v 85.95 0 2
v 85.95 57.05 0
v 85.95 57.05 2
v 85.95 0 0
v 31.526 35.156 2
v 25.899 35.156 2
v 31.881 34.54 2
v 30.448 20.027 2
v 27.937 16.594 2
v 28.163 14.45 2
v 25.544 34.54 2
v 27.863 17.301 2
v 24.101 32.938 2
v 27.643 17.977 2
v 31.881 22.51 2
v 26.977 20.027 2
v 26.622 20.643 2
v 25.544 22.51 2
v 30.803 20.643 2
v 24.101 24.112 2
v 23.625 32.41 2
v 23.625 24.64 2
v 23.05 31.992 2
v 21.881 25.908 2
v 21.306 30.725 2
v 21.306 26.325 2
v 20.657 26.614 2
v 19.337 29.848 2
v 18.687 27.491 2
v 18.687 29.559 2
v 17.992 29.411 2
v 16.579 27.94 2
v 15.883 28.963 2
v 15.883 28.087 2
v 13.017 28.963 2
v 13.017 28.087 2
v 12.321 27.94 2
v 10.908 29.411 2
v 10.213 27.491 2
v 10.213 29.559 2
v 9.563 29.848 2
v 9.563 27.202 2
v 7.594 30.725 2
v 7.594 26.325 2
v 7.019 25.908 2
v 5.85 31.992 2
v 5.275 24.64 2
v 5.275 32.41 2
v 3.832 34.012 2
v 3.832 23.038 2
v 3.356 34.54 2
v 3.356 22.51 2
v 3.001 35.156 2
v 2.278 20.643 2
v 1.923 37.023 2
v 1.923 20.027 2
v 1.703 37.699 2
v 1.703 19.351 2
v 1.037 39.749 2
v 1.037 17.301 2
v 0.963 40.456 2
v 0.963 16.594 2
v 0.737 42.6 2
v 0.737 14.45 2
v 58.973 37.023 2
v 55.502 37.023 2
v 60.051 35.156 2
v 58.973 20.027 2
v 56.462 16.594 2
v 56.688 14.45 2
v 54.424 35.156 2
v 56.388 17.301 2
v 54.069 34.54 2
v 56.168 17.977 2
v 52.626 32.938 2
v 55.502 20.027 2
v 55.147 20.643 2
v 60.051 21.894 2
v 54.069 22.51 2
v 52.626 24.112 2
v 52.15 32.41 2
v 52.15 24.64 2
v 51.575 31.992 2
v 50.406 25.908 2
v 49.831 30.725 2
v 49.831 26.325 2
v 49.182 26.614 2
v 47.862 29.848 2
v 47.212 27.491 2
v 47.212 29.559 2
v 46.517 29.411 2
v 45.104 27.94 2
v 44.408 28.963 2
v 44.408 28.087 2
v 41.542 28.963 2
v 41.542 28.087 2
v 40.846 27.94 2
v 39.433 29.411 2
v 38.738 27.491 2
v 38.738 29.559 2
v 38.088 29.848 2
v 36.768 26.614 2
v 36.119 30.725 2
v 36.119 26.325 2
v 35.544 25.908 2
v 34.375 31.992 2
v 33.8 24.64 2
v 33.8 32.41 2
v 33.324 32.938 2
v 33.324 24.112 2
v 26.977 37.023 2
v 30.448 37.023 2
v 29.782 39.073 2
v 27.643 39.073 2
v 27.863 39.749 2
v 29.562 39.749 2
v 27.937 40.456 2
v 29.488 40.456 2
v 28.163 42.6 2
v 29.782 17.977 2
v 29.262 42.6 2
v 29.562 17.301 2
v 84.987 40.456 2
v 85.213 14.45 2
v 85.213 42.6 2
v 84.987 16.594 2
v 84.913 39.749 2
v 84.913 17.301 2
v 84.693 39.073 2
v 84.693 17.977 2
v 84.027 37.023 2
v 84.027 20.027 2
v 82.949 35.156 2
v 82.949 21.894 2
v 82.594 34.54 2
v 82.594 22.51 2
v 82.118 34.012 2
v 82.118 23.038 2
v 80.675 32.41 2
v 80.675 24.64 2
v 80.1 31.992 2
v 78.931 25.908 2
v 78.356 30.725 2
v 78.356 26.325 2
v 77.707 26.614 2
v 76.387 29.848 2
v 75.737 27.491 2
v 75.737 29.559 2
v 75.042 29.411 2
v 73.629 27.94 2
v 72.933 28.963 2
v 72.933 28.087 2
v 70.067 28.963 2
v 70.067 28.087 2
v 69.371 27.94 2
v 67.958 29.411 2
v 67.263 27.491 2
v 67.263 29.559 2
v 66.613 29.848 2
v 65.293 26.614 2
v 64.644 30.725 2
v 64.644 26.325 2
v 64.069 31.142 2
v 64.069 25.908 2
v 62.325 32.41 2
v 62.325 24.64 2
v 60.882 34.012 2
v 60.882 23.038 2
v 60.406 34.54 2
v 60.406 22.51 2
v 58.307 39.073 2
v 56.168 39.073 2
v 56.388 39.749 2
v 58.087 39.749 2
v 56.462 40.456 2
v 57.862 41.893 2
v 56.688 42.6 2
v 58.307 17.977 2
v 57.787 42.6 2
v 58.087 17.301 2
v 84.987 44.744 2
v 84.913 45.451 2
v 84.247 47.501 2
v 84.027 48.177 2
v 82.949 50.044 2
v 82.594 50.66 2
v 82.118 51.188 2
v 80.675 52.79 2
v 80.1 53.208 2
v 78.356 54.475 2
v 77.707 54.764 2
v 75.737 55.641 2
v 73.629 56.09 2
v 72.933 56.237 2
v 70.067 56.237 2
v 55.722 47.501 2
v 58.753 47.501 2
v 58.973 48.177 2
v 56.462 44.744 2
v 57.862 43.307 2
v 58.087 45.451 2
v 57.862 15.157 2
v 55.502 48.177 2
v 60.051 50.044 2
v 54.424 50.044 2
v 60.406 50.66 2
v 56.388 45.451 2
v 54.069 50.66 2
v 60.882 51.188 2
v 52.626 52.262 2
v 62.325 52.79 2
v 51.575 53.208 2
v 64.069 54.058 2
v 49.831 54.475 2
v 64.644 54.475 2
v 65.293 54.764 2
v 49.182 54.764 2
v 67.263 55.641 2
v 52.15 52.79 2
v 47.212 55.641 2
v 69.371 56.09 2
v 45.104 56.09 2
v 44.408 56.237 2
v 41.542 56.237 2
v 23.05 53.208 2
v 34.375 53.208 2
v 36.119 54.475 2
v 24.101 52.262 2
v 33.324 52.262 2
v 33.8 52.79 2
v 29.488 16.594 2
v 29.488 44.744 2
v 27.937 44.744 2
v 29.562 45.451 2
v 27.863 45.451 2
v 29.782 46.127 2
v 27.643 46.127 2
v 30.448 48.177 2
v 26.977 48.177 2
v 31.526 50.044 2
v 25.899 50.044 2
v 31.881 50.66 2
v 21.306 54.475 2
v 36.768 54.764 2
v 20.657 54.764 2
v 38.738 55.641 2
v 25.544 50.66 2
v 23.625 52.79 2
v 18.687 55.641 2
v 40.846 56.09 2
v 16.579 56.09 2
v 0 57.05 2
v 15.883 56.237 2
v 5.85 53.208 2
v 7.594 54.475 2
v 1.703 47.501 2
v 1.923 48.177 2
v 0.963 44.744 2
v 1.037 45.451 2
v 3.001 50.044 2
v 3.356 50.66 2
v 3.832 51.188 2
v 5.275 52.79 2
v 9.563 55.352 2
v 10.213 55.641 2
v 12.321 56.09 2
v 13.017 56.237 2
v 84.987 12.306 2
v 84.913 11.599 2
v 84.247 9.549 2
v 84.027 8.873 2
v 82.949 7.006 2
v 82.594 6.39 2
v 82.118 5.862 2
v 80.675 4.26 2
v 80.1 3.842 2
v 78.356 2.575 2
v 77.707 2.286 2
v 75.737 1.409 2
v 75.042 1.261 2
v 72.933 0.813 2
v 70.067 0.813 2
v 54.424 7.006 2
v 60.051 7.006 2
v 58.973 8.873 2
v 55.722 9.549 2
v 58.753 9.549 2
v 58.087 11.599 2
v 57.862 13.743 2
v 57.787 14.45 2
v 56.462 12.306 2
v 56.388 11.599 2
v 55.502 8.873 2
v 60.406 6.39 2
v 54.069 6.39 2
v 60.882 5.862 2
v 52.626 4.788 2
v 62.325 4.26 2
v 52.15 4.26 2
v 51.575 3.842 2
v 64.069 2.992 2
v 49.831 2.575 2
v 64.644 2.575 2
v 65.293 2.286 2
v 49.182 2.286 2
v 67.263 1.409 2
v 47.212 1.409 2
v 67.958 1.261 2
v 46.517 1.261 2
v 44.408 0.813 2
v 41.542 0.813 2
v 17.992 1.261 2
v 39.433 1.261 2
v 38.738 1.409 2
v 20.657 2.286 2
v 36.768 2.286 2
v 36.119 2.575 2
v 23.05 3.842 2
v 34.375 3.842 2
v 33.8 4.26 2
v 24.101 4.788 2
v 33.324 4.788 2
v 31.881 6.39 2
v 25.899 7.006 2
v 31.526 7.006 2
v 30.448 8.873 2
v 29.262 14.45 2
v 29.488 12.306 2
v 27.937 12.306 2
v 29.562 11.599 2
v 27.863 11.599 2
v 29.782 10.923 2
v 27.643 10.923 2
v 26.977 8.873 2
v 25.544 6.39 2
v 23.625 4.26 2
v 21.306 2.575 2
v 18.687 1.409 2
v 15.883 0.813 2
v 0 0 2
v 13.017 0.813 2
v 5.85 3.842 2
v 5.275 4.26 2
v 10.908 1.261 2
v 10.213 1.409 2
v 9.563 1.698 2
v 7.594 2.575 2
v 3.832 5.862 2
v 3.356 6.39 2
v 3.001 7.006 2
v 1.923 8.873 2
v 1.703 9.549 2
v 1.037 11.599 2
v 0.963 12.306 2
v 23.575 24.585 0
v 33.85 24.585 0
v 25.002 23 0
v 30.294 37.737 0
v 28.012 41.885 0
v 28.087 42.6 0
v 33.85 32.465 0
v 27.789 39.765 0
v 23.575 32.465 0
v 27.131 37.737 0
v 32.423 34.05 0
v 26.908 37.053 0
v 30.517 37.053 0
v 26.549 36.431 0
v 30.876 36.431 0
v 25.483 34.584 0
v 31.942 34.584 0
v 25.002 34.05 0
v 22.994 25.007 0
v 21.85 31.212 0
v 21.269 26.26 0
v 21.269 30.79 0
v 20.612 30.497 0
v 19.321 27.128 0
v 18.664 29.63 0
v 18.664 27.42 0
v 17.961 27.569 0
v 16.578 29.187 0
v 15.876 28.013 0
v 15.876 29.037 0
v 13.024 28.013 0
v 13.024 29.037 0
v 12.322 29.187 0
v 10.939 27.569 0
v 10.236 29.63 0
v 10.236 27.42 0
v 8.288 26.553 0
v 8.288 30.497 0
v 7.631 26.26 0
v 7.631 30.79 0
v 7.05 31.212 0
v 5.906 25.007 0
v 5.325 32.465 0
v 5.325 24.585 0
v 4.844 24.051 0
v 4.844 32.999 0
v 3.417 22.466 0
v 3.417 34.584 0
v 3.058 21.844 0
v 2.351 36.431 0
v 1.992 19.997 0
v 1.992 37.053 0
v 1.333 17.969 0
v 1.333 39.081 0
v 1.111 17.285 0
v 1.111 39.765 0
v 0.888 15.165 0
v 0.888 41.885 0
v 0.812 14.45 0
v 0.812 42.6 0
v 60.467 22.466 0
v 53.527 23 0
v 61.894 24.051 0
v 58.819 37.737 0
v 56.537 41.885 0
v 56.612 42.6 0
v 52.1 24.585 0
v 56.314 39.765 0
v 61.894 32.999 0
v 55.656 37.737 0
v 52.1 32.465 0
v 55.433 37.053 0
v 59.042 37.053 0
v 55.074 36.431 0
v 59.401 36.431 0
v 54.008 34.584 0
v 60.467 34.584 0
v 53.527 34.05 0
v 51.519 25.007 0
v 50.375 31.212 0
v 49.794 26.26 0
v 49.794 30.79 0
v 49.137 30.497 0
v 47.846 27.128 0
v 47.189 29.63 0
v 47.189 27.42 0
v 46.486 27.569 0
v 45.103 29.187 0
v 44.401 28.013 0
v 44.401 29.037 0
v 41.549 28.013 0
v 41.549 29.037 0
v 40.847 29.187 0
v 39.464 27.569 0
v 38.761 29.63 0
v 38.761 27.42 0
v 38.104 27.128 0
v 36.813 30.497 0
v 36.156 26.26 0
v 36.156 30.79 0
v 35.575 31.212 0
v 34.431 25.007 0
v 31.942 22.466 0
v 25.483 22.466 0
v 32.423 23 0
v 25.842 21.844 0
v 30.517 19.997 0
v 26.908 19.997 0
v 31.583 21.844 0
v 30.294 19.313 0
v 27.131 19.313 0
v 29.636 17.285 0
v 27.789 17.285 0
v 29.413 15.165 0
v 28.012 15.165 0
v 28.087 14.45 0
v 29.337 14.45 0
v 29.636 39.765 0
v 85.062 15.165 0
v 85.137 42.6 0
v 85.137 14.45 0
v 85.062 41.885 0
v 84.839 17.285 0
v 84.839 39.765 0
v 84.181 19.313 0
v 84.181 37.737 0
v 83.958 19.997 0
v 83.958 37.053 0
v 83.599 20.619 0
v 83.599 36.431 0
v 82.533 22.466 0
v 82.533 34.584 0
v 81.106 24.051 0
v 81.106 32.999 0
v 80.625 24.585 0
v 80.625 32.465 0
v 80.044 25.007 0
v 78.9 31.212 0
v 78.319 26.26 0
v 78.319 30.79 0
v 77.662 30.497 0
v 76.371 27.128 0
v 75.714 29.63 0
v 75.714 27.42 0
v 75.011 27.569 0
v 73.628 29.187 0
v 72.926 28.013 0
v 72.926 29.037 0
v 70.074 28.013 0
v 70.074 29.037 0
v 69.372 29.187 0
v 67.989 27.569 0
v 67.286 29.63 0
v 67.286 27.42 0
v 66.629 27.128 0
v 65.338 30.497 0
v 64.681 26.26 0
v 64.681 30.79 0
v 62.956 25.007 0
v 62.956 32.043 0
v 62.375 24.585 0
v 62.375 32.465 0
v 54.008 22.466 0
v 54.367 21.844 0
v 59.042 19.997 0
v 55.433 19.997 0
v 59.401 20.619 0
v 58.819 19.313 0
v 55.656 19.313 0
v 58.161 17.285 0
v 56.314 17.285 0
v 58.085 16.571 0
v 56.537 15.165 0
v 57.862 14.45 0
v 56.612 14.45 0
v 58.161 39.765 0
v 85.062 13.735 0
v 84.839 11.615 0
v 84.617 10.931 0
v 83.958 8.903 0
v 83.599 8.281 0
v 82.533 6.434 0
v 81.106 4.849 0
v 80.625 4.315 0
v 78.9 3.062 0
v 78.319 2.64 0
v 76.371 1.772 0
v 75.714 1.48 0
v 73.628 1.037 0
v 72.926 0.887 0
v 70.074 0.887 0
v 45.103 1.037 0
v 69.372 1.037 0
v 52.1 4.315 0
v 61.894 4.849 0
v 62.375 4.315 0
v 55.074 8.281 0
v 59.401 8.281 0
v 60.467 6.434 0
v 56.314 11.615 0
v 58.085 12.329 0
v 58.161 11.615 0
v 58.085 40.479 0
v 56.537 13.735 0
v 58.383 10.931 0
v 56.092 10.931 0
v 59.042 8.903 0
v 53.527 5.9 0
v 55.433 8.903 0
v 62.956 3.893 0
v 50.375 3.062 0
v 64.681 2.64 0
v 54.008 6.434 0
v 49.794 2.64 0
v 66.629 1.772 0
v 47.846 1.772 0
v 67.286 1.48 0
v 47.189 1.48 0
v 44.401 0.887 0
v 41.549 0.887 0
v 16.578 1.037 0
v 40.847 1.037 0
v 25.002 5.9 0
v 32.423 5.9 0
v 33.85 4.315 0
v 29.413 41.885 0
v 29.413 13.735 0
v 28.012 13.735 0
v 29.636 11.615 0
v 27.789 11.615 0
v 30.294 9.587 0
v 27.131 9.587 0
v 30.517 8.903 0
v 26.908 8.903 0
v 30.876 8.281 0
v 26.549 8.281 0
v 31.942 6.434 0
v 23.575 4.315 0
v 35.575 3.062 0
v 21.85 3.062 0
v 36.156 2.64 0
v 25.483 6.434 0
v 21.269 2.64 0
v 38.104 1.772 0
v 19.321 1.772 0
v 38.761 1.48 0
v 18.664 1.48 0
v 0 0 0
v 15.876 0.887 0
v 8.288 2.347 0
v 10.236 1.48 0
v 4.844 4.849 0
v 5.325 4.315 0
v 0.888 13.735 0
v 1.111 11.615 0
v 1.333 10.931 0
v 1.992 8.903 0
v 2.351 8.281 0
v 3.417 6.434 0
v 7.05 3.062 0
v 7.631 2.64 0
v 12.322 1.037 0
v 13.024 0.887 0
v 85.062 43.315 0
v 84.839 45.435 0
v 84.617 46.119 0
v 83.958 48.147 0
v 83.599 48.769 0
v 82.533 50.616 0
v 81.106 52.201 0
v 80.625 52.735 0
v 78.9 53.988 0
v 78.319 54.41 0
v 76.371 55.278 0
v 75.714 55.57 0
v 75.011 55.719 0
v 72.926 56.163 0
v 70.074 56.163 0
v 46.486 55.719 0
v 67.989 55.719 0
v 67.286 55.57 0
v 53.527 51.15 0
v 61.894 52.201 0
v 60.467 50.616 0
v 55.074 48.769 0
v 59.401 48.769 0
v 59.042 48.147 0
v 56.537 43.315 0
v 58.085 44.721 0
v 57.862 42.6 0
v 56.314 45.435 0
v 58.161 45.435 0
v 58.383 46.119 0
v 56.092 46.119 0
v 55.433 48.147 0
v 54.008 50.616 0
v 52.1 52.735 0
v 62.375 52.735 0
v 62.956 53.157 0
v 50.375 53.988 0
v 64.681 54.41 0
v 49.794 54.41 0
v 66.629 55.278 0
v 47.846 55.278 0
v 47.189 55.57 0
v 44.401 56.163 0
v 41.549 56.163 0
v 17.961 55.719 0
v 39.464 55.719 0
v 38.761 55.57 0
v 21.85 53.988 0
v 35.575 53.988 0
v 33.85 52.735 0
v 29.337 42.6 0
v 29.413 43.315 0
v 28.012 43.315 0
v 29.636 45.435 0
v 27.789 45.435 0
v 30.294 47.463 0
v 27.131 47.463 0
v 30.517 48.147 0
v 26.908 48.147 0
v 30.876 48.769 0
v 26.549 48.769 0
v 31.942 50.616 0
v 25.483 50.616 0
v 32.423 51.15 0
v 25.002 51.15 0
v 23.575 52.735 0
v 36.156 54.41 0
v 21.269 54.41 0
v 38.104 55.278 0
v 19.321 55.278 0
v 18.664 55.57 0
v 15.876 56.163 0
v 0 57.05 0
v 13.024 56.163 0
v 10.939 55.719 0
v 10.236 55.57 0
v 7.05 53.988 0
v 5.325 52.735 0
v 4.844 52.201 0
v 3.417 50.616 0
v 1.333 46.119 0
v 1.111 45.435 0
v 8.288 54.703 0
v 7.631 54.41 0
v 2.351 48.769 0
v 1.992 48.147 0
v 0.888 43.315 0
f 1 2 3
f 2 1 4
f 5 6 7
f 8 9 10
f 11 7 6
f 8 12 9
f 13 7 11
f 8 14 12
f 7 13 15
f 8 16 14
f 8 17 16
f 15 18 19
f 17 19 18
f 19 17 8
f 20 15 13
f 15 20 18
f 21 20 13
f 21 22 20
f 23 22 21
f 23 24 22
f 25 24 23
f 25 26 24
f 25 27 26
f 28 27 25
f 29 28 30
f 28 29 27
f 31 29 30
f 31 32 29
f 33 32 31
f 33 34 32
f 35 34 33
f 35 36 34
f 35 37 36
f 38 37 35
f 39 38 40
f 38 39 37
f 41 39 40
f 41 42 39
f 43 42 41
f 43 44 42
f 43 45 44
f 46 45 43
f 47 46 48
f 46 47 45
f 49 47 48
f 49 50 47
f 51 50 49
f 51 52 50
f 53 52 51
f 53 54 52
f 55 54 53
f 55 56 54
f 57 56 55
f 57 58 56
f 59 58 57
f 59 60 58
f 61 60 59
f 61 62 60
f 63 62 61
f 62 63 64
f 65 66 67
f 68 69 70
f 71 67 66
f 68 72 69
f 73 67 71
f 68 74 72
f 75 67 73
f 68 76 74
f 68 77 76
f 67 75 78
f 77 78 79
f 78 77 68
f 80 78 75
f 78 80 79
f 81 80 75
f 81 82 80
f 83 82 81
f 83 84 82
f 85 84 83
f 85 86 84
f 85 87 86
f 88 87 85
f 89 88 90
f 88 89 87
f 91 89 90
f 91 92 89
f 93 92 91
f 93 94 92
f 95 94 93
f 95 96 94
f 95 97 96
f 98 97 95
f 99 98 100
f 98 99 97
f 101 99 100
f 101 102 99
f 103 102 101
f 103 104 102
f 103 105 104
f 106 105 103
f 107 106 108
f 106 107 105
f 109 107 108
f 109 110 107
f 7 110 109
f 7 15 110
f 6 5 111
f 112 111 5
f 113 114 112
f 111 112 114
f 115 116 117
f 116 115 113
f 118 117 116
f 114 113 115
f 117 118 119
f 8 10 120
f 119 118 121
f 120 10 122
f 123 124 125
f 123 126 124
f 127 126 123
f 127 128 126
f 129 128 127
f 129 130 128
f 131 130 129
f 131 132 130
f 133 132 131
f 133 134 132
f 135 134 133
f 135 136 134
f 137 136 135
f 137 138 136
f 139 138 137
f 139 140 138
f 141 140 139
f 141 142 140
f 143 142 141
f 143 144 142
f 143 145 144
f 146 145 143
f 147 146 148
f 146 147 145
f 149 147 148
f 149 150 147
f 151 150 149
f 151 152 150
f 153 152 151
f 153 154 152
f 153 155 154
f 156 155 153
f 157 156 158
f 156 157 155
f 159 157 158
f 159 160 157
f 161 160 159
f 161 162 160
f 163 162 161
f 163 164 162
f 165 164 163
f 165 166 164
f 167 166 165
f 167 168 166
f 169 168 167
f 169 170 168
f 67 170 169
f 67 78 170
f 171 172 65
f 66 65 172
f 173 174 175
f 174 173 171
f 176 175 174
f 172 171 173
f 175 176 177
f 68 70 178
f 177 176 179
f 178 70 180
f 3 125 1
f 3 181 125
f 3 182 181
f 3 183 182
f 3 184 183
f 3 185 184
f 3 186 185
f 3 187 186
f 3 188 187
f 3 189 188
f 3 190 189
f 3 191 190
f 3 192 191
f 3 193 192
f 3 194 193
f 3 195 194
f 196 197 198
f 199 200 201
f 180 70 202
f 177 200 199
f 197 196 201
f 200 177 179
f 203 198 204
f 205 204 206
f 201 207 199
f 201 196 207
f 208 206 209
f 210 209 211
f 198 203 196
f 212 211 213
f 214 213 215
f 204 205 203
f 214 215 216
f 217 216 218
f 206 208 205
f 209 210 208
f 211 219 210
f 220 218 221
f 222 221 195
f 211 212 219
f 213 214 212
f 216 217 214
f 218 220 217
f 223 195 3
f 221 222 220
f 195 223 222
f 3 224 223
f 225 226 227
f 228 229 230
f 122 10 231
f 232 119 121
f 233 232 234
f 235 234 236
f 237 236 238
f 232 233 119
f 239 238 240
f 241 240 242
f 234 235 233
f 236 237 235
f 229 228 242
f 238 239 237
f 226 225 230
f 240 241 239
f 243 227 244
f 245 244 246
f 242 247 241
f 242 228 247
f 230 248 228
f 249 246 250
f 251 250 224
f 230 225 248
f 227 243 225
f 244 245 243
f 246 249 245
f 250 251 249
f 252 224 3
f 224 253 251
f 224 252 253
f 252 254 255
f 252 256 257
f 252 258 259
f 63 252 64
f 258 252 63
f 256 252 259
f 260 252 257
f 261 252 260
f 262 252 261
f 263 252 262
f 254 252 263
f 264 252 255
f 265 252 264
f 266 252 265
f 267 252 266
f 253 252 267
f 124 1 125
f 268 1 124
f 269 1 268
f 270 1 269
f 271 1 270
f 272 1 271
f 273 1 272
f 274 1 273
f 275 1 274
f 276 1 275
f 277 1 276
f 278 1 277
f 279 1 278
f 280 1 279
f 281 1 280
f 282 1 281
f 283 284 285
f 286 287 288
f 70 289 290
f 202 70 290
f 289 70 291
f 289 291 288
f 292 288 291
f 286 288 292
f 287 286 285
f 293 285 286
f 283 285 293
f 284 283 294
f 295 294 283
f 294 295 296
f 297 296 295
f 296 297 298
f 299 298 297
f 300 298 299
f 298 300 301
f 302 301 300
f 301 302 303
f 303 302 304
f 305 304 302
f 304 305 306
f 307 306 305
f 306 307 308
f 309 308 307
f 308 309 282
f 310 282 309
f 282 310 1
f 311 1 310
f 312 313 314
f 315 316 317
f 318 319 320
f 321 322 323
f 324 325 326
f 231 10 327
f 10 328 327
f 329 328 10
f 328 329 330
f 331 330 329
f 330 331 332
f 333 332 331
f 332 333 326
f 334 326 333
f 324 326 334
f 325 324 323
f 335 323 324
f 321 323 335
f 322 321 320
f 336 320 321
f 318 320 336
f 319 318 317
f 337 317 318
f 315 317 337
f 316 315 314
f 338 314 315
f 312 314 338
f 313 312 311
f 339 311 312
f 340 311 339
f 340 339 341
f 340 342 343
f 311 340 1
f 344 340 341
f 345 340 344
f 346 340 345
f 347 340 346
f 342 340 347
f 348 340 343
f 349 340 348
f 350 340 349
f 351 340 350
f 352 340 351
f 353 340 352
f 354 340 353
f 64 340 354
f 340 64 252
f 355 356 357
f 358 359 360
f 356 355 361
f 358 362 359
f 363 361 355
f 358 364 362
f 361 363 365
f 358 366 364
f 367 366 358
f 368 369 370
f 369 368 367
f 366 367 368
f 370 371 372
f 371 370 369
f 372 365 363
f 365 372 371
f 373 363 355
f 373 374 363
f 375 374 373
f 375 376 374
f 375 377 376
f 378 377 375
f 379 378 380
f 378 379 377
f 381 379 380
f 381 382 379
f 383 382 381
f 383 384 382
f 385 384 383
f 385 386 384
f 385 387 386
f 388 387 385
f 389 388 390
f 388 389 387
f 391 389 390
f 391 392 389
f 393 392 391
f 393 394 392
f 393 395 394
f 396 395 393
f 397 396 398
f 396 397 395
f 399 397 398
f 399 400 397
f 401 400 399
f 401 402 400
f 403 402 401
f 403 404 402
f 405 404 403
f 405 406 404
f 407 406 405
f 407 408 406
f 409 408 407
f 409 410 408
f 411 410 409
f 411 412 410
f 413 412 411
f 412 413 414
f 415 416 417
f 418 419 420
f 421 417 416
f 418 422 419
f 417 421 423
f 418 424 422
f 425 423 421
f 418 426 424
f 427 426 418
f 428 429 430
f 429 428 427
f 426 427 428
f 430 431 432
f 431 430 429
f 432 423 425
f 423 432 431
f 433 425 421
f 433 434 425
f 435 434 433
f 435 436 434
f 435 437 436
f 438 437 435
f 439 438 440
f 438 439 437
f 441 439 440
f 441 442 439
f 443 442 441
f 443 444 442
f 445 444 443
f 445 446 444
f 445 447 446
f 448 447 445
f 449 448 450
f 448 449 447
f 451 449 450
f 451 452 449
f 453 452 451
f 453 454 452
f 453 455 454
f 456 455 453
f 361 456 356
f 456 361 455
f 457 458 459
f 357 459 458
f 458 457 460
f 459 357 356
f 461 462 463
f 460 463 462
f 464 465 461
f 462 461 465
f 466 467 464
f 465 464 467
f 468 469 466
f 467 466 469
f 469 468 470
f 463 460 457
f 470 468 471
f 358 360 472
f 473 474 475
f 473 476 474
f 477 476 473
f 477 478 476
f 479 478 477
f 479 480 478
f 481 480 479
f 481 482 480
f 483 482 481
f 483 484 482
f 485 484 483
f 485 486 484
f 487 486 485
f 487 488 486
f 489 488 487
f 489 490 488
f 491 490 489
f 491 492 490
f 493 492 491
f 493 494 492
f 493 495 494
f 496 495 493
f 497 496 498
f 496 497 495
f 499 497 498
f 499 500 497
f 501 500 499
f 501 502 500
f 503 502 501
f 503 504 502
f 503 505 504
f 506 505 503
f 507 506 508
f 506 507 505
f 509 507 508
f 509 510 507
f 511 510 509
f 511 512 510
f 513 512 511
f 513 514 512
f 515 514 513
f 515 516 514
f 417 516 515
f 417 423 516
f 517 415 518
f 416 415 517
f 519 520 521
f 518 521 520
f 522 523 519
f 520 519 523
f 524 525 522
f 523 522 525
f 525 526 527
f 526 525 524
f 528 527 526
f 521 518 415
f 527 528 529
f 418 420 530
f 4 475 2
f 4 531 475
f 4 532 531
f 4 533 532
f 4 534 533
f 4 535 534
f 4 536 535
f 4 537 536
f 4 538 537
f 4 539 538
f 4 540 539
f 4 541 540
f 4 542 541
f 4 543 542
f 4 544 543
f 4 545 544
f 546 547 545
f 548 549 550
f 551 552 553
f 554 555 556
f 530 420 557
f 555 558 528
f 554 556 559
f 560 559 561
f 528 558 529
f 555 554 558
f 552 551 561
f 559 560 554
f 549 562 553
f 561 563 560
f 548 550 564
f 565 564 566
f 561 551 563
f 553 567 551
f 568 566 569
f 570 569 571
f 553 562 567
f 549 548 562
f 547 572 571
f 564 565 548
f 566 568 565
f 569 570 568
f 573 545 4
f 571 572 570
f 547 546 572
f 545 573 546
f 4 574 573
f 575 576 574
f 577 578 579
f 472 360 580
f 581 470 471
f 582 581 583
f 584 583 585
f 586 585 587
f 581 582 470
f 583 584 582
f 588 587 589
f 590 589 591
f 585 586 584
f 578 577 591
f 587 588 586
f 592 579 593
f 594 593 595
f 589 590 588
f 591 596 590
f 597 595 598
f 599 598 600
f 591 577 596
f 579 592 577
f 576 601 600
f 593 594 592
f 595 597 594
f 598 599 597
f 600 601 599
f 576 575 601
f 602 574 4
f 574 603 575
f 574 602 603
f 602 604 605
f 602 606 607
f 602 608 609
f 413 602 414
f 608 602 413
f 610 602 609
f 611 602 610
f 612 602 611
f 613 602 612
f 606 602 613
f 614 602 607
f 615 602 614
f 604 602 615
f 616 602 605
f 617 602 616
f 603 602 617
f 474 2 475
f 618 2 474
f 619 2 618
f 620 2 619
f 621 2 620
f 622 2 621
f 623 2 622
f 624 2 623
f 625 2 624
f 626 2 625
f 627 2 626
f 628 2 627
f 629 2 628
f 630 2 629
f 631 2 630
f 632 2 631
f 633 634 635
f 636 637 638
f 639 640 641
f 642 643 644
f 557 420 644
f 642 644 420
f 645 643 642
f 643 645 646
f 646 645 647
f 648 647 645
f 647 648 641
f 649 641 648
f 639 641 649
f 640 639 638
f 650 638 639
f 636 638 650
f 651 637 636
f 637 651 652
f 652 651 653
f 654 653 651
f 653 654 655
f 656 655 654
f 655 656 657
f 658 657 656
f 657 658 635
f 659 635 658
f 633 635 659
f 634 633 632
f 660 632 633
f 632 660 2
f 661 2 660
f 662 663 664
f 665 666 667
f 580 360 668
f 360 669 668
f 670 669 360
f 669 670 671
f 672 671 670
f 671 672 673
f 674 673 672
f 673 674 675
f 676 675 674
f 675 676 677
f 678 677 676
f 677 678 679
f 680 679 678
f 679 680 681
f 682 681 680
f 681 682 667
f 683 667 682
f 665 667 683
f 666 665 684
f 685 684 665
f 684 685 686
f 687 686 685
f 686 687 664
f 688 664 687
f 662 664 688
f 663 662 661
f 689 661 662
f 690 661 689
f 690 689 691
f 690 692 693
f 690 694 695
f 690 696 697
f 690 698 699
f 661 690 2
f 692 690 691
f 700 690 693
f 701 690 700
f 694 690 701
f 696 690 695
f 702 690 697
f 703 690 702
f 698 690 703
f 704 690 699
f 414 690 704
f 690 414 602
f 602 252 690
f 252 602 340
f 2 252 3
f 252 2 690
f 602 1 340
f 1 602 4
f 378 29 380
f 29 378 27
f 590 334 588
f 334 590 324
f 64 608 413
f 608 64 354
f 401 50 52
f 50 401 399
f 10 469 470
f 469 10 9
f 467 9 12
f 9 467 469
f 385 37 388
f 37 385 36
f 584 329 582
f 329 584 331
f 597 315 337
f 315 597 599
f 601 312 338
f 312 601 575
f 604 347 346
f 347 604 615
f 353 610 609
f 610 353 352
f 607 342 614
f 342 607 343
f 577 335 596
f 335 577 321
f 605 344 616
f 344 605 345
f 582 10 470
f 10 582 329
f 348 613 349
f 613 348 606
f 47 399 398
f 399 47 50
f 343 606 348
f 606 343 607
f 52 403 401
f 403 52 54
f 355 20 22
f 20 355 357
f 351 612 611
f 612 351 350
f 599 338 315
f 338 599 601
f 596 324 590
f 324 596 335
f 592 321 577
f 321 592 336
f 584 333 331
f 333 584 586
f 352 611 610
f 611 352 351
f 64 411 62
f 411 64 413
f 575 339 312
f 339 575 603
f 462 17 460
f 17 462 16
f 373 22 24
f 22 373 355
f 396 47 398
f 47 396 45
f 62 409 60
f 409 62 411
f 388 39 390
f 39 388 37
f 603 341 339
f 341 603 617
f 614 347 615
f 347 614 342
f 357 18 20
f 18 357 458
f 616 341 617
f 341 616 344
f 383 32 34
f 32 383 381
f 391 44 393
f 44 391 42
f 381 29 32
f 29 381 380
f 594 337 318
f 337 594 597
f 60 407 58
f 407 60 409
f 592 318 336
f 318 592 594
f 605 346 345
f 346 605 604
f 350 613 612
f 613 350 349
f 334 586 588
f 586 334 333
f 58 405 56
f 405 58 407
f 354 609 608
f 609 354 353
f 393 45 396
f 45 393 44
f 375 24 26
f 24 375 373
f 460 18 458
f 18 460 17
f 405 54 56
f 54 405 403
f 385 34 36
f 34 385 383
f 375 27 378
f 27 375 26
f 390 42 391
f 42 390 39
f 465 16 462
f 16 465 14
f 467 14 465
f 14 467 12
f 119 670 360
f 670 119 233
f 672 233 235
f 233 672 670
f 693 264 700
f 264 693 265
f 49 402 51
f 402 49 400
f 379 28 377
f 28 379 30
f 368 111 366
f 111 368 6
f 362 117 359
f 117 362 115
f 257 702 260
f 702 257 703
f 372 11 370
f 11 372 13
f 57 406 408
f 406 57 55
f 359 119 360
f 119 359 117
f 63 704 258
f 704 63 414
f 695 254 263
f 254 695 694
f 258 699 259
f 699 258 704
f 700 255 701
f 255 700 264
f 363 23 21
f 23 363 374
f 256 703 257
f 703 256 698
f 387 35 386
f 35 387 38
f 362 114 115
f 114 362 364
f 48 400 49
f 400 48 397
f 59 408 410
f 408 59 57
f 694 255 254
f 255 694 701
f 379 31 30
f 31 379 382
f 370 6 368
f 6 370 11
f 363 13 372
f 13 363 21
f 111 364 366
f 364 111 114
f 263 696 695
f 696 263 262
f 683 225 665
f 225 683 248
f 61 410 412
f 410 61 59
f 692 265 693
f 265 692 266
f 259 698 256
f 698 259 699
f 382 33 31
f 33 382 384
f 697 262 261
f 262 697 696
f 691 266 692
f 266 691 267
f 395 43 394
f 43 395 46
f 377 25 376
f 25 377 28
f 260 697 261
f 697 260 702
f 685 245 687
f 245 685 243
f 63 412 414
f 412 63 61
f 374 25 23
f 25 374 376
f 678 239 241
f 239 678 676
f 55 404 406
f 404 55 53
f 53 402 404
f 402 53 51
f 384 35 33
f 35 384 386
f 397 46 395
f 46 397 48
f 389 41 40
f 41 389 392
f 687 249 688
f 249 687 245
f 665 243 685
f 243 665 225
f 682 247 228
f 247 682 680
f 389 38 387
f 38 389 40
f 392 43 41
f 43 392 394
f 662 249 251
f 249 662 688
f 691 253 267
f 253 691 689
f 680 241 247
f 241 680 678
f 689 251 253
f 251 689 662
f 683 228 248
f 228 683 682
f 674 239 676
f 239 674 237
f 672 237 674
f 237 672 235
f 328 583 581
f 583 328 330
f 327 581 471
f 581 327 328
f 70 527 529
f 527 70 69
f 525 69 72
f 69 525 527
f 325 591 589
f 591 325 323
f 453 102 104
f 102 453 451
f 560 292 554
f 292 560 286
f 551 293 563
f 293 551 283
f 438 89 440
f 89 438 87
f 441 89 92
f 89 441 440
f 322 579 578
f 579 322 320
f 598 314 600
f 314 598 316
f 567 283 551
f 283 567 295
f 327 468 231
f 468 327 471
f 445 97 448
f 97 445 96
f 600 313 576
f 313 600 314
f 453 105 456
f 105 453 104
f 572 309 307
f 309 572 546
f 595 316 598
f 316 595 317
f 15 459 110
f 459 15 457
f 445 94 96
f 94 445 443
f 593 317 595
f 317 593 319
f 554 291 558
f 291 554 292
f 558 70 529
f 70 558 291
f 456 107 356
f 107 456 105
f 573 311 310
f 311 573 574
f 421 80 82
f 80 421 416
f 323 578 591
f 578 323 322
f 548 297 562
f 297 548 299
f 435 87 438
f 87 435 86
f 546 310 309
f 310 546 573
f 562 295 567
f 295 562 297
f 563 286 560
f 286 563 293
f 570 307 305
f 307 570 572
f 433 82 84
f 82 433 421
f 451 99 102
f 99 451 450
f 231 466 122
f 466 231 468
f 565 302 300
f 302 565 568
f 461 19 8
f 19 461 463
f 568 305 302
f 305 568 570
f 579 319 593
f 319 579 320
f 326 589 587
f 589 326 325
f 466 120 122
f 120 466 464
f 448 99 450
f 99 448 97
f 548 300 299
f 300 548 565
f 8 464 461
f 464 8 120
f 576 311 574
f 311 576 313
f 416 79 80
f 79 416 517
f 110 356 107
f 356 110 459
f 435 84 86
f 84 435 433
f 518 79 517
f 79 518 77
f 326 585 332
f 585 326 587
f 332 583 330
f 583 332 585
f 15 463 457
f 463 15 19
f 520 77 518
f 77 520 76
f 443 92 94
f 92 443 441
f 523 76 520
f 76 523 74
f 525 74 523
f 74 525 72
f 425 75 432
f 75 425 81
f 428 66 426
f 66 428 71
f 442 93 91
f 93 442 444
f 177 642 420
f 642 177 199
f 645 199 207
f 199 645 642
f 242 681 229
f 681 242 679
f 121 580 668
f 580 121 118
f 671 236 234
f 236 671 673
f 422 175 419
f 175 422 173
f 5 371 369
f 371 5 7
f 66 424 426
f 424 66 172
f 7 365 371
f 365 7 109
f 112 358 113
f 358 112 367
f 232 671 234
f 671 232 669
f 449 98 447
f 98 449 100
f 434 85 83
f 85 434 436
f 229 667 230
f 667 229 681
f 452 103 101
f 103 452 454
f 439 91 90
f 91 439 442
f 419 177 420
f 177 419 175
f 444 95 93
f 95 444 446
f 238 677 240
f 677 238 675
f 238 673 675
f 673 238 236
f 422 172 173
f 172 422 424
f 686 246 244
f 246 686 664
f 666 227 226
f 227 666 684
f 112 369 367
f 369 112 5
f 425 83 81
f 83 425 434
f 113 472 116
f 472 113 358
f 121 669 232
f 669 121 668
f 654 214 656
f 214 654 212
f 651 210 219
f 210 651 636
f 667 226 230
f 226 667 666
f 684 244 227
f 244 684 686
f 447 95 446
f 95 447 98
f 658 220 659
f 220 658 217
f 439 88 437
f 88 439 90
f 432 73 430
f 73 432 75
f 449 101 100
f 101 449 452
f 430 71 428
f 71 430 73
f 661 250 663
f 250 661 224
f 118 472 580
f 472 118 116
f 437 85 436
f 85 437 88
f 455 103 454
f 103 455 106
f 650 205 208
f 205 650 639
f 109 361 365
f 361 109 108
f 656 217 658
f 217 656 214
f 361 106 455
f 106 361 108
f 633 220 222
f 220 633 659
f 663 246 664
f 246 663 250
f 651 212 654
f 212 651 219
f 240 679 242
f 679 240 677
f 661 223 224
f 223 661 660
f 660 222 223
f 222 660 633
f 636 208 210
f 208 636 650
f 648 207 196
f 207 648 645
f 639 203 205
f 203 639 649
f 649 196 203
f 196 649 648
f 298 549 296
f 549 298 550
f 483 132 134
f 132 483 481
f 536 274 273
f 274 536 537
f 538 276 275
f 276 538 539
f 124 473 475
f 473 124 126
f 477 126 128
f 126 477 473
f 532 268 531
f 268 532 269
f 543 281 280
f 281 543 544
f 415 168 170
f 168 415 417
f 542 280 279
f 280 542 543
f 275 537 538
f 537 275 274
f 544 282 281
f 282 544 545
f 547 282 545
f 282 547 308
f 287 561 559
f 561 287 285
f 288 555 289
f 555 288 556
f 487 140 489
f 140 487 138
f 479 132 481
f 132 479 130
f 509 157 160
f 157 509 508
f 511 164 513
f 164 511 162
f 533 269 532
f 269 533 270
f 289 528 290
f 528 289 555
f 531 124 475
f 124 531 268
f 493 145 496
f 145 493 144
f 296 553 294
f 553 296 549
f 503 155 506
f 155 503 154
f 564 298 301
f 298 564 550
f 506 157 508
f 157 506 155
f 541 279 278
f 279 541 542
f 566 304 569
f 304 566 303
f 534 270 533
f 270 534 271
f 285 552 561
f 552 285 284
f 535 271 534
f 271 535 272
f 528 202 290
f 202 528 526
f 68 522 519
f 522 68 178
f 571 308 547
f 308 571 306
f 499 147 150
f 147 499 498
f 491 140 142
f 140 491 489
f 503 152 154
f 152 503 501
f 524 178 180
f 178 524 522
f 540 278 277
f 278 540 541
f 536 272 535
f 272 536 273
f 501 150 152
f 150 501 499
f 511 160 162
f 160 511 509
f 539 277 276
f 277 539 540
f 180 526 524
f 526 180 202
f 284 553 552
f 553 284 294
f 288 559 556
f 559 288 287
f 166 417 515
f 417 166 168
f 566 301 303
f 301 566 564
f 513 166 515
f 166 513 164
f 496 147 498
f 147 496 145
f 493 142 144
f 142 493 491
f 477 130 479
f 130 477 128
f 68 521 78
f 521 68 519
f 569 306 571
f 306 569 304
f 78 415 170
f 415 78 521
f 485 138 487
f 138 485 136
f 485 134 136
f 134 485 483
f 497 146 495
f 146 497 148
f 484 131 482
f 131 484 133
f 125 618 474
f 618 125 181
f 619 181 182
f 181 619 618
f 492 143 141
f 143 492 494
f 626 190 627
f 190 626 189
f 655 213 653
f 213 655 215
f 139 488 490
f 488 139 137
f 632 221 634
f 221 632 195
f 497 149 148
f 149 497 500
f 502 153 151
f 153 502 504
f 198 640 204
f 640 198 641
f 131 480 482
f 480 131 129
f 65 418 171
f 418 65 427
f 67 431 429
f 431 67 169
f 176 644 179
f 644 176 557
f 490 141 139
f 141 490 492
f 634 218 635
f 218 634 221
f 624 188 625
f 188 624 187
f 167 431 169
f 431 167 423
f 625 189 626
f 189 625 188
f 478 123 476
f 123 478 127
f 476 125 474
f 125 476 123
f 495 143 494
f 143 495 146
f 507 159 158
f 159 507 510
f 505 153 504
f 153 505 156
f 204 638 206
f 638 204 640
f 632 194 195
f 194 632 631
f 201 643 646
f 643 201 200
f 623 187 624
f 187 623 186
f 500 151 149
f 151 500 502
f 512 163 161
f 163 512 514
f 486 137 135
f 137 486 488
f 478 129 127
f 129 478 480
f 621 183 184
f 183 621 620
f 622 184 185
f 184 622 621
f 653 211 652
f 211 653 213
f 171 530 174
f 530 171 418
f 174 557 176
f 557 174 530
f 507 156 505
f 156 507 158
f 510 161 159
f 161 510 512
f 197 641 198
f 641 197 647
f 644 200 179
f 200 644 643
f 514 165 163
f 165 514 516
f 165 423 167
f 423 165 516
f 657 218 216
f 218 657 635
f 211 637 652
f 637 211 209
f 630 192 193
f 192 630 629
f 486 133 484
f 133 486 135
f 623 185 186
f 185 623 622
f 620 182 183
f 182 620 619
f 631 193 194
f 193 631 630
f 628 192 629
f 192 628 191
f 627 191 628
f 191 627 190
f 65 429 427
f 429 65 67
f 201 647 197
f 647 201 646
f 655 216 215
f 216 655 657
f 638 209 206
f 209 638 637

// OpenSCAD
// [FL_INDEX: keywords="openscad, 3d_parametric, Dollar_coin_wallet_holder__parametric, csg_solid" | COT="Parametric OpenSCAD design from 3DCodeverse"]
// Title: Dollar coin wallet holder (parametric)

coin_d	=	26.4 + 1;
coin_r	=	coin_d / 2;
coin_h	=	2;

buffer	=	0.75;

card_w	=	(3 * coin_d) + (5 * buffer);	//86
card_l	=	(2 * coin_d) + (3 * buffer);	//56
card_h	=	coin_h;	//2

difference() {
	cube([card_w, card_l, card_h]);

	translate([coin_r+buffer, coin_r+buffer, -1]){
		cylinder(r1=coin_r-0.1, r2=coin_r+0.05, h=4);
	}
	translate([coin_r+buffer, card_l-coin_r-buffer, -1]){
		cylinder(r1=coin_r-0.1, r2=coin_r+0.05, h=4);
	}

	translate([card_w/2, coin_r+buffer, -1]){
		cylinder(r1=coin_r-0.1, r2=coin_r+0.05, h=4);
	}
	translate([card_w/2, card_l-coin_r-buffer, -1]){
		cylinder(r1=coin_r-0.1, r2=coin_r+0.05, h=4);
	}

	translate([card_w-coin_r-buffer, coin_r+buffer, -1]){
		cylinder(r1=coin_r-0.1, r2=coin_r+0.05, h=4);
	}
	translate([card_w-coin_r-buffer, card_l-coin_r-buffer, -1]){
		cylinder(r1=coin_r-0.1, r2=coin_r+0.05, h=4);
	}
}
